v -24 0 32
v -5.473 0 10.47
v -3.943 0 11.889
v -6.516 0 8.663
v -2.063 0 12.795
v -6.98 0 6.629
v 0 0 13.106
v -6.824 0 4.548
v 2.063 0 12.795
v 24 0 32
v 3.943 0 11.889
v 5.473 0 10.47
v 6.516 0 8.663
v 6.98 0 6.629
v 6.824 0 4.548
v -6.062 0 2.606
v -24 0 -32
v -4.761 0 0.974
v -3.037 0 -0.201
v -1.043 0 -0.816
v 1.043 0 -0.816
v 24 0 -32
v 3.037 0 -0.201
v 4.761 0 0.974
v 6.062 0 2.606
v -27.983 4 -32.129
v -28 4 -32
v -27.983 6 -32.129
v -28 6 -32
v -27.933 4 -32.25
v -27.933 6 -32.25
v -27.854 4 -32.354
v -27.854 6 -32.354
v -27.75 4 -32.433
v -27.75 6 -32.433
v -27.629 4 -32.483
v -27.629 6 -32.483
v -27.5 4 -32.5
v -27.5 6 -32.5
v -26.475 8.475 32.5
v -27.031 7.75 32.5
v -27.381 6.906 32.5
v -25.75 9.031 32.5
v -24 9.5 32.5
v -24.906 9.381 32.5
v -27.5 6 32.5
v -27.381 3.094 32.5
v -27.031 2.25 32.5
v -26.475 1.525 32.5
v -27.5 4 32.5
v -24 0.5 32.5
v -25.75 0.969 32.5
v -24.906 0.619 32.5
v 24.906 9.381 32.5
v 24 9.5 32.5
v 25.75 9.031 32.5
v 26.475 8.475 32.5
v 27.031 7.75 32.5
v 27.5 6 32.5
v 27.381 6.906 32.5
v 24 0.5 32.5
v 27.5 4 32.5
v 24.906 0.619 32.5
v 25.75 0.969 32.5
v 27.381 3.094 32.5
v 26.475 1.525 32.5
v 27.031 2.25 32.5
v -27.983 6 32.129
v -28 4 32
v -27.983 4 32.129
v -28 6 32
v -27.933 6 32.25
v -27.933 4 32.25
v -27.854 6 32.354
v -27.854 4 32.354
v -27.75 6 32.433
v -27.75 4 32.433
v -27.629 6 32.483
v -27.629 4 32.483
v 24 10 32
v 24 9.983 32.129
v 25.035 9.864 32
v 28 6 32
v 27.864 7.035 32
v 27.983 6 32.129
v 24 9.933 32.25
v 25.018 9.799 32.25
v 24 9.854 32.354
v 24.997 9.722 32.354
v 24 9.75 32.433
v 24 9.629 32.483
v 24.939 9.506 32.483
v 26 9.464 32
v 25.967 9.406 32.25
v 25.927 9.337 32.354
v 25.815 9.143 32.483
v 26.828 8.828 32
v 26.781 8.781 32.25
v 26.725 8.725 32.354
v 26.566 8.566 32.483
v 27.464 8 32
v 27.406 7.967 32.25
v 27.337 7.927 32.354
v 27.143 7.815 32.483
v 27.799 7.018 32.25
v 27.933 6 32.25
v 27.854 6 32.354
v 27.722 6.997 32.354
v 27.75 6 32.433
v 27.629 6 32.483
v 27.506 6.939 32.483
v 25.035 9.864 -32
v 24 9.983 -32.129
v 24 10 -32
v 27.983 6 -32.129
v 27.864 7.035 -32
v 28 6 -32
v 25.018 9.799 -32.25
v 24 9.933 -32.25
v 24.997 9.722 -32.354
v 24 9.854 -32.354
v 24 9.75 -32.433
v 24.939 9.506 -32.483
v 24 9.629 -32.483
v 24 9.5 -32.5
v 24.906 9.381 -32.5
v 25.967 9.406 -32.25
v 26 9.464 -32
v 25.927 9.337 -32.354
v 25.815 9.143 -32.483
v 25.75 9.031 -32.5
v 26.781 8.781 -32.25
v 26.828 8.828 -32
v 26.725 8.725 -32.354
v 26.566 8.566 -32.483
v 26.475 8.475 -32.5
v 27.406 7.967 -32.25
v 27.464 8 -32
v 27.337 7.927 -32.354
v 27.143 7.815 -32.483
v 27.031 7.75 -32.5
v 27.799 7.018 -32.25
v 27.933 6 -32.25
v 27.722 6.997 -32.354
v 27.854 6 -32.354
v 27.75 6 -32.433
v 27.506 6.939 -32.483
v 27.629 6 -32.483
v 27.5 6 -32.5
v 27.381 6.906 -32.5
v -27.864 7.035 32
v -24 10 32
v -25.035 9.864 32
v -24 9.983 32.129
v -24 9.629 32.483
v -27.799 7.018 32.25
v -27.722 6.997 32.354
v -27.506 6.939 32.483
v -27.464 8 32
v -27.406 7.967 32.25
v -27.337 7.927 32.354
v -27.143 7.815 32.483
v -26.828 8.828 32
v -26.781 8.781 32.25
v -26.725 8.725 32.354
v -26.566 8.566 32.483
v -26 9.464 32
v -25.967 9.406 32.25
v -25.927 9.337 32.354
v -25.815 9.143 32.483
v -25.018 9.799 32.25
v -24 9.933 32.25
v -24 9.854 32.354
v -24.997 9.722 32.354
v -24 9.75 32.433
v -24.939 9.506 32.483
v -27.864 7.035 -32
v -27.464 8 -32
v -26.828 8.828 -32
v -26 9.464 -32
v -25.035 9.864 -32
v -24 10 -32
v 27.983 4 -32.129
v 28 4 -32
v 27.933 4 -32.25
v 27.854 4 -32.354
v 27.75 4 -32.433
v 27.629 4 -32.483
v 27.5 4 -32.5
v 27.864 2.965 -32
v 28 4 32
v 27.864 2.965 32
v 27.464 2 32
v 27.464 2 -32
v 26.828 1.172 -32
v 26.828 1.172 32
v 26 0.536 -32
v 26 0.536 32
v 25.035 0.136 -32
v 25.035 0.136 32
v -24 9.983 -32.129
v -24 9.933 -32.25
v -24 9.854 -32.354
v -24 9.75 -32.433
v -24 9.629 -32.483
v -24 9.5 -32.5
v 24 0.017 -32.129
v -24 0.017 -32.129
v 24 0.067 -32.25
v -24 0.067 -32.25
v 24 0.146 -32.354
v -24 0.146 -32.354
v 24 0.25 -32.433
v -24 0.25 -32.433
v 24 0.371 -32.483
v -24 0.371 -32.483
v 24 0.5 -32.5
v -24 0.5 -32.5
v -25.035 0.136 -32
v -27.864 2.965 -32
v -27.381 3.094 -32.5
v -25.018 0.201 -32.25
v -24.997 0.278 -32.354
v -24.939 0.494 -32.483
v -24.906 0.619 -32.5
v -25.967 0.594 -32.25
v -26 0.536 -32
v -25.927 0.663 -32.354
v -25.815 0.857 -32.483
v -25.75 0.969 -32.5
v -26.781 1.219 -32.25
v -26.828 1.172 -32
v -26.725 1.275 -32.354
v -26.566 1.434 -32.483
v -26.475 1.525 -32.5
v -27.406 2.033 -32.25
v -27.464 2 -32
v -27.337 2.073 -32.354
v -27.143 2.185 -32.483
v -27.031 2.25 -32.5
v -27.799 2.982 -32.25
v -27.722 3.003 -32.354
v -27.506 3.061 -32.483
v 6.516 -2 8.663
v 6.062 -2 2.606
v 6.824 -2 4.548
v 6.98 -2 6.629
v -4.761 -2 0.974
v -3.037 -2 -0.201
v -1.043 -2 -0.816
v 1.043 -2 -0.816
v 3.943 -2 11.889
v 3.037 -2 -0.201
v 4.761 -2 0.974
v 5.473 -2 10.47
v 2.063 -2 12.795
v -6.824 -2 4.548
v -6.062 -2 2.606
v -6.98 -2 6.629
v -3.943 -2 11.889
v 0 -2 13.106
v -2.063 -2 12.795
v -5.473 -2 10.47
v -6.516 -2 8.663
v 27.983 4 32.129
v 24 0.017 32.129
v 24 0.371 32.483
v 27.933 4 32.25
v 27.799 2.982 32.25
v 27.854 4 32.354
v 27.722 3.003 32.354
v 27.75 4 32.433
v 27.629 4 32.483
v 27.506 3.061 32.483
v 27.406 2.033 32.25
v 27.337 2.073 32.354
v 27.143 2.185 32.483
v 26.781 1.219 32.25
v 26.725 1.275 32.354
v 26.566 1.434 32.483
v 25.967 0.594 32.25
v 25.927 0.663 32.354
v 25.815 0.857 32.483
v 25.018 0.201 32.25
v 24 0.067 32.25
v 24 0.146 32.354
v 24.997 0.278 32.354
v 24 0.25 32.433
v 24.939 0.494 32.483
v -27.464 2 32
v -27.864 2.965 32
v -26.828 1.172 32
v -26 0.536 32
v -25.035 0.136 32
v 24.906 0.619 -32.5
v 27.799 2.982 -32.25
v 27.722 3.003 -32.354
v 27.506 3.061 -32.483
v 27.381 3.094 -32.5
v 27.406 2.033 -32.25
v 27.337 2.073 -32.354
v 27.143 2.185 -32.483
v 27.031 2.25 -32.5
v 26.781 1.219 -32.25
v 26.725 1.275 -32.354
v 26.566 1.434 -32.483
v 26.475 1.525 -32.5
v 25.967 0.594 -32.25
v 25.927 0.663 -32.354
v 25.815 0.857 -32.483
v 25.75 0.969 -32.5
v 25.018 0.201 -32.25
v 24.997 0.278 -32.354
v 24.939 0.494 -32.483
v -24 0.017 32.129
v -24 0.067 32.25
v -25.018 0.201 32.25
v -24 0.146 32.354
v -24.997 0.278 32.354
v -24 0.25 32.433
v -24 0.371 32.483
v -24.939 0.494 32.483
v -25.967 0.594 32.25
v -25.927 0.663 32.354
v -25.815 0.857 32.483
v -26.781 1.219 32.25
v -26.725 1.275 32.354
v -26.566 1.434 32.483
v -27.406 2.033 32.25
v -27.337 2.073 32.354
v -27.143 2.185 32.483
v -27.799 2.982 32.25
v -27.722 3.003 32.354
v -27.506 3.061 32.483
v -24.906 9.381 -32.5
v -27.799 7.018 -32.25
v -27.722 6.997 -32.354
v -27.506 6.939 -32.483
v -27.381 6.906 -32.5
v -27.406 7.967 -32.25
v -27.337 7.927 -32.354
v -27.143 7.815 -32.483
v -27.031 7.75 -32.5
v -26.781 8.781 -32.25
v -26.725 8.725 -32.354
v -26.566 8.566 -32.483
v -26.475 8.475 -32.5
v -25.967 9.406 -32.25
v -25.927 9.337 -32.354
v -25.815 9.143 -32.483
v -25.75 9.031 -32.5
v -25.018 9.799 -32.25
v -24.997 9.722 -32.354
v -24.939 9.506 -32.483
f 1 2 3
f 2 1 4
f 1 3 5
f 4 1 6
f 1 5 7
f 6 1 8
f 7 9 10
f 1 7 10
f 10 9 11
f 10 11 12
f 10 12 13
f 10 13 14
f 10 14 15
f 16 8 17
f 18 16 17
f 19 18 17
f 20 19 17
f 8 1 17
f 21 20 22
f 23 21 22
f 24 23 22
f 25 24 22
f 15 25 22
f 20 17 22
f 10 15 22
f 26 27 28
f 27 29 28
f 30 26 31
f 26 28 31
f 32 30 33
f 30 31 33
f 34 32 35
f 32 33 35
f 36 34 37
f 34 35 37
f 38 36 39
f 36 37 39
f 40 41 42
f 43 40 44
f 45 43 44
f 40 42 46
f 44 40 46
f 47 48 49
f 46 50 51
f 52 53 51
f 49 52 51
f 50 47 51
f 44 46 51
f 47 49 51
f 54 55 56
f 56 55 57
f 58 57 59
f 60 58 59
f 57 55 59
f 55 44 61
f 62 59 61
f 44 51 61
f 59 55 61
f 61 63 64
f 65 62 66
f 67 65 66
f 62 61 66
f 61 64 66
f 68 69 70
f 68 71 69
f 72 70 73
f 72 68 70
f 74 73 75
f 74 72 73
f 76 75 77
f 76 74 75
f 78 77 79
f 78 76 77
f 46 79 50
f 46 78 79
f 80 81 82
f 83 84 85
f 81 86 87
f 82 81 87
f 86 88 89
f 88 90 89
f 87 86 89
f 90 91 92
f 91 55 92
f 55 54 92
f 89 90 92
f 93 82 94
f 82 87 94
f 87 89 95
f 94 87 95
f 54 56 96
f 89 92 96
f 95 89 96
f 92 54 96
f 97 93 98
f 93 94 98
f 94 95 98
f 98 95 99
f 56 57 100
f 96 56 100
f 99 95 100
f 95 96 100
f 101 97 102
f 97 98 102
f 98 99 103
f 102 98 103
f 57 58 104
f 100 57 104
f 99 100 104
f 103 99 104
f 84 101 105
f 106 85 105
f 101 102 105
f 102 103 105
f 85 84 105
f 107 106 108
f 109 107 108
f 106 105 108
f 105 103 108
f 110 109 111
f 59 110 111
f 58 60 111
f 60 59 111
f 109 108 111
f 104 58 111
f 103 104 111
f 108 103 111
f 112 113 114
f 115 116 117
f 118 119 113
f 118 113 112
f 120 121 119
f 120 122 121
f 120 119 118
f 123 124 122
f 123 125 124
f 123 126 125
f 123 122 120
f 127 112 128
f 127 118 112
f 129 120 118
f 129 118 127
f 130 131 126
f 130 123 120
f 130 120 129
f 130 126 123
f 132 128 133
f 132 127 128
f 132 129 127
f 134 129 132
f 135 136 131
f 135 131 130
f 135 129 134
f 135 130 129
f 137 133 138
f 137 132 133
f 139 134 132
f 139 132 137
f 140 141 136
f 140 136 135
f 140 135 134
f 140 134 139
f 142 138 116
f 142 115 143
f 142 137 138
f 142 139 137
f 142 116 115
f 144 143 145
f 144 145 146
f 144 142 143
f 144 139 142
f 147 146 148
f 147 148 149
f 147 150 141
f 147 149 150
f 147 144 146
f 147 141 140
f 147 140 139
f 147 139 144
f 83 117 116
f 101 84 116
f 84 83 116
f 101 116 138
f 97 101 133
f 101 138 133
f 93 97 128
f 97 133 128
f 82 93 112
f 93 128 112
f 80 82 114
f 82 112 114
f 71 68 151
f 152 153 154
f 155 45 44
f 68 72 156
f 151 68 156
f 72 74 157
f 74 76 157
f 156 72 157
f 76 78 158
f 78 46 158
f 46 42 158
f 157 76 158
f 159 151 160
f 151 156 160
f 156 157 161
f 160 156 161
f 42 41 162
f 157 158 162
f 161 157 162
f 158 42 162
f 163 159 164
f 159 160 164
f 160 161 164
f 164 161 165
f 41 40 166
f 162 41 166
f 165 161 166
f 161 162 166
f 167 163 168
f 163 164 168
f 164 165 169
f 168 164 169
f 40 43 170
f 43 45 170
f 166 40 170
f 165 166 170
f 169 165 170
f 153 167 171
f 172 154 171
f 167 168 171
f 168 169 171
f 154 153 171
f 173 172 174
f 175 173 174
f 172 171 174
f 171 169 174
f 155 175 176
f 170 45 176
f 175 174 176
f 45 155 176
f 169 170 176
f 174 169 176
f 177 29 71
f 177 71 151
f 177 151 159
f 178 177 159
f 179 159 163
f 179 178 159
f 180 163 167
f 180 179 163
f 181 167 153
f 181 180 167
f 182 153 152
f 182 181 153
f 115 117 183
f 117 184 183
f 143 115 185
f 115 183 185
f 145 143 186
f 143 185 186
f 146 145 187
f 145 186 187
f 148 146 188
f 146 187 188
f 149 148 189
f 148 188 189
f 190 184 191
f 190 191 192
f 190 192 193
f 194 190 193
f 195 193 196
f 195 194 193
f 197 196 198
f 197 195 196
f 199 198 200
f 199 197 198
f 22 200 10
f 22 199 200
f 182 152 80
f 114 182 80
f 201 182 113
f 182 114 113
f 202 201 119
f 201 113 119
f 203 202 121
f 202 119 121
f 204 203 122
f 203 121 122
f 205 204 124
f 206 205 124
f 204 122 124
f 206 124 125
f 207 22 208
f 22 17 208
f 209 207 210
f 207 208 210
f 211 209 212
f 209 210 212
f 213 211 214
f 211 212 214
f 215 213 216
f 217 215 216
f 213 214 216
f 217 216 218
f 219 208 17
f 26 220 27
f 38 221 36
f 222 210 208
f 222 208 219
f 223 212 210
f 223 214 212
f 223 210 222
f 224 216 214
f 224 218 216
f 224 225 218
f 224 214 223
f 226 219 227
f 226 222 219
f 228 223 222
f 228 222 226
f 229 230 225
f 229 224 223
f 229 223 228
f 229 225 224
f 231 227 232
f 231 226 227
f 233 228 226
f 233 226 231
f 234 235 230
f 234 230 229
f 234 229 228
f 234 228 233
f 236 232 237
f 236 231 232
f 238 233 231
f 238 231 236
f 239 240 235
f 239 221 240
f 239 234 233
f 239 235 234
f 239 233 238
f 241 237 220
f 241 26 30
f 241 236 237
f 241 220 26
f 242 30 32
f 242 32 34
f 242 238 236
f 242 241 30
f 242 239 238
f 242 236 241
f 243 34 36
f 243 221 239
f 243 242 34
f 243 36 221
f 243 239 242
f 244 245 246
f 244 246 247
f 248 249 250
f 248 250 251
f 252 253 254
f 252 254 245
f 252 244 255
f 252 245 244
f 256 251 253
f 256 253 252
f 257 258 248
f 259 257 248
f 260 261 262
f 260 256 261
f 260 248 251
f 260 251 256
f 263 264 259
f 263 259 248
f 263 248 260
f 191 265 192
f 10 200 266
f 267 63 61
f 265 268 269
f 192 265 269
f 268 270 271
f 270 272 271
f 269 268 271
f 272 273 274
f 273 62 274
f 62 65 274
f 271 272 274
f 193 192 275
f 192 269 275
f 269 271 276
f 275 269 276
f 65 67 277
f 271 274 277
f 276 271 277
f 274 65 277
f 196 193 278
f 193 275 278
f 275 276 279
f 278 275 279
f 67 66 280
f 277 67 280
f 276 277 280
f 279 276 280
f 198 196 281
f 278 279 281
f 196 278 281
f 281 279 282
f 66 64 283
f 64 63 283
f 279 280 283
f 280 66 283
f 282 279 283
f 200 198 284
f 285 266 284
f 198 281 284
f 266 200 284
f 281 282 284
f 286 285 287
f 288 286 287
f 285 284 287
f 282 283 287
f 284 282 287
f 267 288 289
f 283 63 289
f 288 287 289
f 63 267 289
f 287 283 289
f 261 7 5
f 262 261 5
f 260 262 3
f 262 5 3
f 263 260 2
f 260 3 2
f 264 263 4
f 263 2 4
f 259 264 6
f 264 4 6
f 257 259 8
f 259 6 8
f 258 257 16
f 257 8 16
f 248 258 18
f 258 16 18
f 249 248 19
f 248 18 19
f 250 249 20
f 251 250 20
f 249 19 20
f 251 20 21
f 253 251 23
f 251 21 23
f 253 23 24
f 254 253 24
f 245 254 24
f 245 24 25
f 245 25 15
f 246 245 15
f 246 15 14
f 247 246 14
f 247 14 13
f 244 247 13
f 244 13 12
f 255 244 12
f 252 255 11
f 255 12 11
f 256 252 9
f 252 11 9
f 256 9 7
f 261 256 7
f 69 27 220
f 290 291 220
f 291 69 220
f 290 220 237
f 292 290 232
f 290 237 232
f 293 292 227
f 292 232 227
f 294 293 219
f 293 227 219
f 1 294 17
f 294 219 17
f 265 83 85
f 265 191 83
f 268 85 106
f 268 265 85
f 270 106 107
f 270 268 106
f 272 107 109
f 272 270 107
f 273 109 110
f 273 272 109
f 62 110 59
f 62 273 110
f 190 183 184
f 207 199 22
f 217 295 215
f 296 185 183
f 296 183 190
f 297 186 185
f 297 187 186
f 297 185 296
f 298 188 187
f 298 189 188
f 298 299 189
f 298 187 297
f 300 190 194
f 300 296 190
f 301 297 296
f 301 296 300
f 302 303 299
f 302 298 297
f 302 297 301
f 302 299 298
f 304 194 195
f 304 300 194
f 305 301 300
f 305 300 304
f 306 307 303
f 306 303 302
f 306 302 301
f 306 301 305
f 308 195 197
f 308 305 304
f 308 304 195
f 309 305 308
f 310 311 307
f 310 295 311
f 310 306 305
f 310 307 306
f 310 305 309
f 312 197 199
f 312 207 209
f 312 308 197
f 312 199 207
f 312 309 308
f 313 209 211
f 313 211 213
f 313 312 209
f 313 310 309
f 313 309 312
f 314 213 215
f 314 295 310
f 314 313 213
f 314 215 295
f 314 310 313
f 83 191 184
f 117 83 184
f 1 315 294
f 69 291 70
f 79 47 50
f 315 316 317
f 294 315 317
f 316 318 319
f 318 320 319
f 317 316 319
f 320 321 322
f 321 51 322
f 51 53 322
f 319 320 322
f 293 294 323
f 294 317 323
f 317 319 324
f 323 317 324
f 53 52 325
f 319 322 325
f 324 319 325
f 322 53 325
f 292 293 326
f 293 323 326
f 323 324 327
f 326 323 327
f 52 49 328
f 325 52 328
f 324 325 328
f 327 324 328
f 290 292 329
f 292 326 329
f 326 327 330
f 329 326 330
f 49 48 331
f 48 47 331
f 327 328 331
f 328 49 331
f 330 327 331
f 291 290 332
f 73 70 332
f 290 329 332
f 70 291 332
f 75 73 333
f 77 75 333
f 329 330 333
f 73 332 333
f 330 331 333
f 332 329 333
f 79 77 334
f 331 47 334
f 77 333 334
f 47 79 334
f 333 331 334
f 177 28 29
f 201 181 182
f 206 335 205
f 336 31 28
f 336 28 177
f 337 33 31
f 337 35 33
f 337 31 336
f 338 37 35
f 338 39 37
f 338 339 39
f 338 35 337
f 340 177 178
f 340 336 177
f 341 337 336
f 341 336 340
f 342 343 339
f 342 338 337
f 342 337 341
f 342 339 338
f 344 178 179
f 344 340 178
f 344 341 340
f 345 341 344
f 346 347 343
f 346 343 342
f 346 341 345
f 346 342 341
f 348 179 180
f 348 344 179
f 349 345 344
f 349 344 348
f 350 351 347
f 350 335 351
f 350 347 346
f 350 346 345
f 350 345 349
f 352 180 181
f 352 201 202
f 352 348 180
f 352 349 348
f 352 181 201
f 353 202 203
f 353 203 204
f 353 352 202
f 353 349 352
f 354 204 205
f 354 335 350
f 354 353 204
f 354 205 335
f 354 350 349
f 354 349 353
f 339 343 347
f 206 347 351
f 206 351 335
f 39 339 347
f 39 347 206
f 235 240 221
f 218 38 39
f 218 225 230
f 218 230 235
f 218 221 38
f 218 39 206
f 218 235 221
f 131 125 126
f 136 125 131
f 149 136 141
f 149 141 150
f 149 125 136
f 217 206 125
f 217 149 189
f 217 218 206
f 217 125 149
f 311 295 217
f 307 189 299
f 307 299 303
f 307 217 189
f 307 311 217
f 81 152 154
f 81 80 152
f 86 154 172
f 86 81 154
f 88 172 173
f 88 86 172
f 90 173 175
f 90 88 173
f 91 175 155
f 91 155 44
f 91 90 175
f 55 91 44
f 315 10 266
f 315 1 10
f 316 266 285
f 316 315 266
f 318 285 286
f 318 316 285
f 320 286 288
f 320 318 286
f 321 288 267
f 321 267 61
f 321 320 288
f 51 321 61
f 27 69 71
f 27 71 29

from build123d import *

# Parameters (mm, degrees)
SKETCH_1_W      = 56
SKETCH_1_H      = 65
EXTRUDE_1_DEPTH = 10
FILLET_1_R      = 4
FILLET_2_R      = 0.5
SKETCH_2_R      = 7
EXTRUDE_2_DEPTH = 2


with BuildPart() as part:
    # 草图1 → 凸台-拉伸1 (new body)
    with BuildSketch(Plane(origin=(0, 0, 0), x_dir=(1, 0, 0), z_dir=(0, 1, 0))):
        Rectangle(SKETCH_1_W, SKETCH_1_H)
    extrude(amount=EXTRUDE_1_DEPTH)

    # 圆角1
    fillet_1_edges = [part.edges().sort_by_distance(p)[0] for p in [
        (-28, 10, 0),
        (28, 10, 0),
        (-28, 0, 0),
        (28, 0, 0),
    ]]
    fillet(fillet_1_edges, radius=FILLET_1_R)

    # 圆角2
    fillet_2_edges = [part.edges().sort_by_distance(p)[0] for p in [
        (-28, 5, 32.5),
        (-28, 5, -32.5),
        (0, 0, 32.5),
        (28, 5, 32.5),
        (0, 10, 32.5),
        (-26.828427125, 8.828427125, 32.5),
        (26.828427125, 8.828427125, 32.5),
        (26.828427125, 1.171572875, 32.5),
        (-26.828427125, 1.171572875, 32.5),
        (0, 0, -32.5),
        (0, 10, -32.5),
        (28, 5, -32.5),
        (-26.828427125, 8.828427125, -32.5),
        (26.828427125, 8.828427125, -32.5),
        (26.828427125, 1.171572875, -32.5),
        (-26.828427125, 1.171572875, -32.5),
    ]]
    fillet(fillet_2_edges, radius=FILLET_2_R)

    # 草图2 → 凸台-拉伸2 (add)
    with BuildSketch(Plane.XZ):
        with Locations(Location((0, 6.105786748, 0), (0, 0, 90))):
            Circle(SKETCH_2_R)
    extrude(amount=EXTRUDE_2_DEPTH)


solid = part.part
